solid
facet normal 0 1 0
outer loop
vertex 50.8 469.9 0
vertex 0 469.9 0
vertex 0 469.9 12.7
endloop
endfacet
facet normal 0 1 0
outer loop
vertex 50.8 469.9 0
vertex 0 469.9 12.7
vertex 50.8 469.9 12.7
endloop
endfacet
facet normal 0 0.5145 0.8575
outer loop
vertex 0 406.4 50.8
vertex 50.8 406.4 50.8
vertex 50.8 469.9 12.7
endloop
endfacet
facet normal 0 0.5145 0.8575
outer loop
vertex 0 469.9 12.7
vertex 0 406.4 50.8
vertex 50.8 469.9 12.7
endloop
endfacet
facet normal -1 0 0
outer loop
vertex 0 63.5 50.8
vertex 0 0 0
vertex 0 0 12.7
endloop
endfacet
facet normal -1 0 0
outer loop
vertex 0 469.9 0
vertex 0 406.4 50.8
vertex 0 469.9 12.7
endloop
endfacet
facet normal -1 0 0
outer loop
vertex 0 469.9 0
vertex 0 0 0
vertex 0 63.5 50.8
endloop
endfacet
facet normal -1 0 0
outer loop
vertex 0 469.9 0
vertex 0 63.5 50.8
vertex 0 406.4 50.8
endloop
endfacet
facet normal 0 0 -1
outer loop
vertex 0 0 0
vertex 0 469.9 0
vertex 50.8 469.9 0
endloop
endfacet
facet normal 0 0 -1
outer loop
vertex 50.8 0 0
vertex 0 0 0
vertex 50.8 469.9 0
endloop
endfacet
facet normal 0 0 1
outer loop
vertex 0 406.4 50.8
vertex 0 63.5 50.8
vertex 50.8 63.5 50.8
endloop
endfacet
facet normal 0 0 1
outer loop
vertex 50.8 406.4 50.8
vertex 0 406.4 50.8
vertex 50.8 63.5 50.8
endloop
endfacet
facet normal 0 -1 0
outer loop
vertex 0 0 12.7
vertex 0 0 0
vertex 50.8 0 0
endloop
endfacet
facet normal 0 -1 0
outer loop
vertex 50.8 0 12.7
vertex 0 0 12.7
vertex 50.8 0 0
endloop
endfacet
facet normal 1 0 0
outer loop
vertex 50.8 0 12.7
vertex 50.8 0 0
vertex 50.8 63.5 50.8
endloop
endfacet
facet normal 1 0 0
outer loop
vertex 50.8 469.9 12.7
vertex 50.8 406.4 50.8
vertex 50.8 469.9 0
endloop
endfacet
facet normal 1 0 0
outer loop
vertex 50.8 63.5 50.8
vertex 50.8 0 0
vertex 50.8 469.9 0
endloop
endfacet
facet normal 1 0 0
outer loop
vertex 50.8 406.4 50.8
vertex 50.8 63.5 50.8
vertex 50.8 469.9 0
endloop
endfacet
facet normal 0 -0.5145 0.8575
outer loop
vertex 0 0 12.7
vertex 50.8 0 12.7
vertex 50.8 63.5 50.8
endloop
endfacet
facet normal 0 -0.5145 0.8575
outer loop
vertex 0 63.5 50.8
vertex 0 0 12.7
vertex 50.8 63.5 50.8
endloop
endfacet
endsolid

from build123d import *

# Parameters (mm, degrees)
F0_W     = 50.8
F0_H     = 469.9
F1_DEPTH = 50.8
F3_DEPTH = 50.801


with BuildPart() as f1:
    # F0 (on Top) → F1 (new body)
    with BuildSketch(Plane.XY):
        with Locations((25.4, 234.95)):
            Rectangle(F0_W, F0_H)
    extrude(amount=F1_DEPTH)

    # F2 (on face) → F3 (cut, through all)
    with BuildSketch(Plane.YZ.offset(50.8)):
        Polygon((0, 50.8), (0, 12.7), (63.5, 50.8), align=None)
        Polygon((406.4, 50.8), (469.9, 12.7), (469.9, 50.8), align=None)
    extrude(amount=-F3_DEPTH, mode=Mode.SUBTRACT)


solid = f1.part
